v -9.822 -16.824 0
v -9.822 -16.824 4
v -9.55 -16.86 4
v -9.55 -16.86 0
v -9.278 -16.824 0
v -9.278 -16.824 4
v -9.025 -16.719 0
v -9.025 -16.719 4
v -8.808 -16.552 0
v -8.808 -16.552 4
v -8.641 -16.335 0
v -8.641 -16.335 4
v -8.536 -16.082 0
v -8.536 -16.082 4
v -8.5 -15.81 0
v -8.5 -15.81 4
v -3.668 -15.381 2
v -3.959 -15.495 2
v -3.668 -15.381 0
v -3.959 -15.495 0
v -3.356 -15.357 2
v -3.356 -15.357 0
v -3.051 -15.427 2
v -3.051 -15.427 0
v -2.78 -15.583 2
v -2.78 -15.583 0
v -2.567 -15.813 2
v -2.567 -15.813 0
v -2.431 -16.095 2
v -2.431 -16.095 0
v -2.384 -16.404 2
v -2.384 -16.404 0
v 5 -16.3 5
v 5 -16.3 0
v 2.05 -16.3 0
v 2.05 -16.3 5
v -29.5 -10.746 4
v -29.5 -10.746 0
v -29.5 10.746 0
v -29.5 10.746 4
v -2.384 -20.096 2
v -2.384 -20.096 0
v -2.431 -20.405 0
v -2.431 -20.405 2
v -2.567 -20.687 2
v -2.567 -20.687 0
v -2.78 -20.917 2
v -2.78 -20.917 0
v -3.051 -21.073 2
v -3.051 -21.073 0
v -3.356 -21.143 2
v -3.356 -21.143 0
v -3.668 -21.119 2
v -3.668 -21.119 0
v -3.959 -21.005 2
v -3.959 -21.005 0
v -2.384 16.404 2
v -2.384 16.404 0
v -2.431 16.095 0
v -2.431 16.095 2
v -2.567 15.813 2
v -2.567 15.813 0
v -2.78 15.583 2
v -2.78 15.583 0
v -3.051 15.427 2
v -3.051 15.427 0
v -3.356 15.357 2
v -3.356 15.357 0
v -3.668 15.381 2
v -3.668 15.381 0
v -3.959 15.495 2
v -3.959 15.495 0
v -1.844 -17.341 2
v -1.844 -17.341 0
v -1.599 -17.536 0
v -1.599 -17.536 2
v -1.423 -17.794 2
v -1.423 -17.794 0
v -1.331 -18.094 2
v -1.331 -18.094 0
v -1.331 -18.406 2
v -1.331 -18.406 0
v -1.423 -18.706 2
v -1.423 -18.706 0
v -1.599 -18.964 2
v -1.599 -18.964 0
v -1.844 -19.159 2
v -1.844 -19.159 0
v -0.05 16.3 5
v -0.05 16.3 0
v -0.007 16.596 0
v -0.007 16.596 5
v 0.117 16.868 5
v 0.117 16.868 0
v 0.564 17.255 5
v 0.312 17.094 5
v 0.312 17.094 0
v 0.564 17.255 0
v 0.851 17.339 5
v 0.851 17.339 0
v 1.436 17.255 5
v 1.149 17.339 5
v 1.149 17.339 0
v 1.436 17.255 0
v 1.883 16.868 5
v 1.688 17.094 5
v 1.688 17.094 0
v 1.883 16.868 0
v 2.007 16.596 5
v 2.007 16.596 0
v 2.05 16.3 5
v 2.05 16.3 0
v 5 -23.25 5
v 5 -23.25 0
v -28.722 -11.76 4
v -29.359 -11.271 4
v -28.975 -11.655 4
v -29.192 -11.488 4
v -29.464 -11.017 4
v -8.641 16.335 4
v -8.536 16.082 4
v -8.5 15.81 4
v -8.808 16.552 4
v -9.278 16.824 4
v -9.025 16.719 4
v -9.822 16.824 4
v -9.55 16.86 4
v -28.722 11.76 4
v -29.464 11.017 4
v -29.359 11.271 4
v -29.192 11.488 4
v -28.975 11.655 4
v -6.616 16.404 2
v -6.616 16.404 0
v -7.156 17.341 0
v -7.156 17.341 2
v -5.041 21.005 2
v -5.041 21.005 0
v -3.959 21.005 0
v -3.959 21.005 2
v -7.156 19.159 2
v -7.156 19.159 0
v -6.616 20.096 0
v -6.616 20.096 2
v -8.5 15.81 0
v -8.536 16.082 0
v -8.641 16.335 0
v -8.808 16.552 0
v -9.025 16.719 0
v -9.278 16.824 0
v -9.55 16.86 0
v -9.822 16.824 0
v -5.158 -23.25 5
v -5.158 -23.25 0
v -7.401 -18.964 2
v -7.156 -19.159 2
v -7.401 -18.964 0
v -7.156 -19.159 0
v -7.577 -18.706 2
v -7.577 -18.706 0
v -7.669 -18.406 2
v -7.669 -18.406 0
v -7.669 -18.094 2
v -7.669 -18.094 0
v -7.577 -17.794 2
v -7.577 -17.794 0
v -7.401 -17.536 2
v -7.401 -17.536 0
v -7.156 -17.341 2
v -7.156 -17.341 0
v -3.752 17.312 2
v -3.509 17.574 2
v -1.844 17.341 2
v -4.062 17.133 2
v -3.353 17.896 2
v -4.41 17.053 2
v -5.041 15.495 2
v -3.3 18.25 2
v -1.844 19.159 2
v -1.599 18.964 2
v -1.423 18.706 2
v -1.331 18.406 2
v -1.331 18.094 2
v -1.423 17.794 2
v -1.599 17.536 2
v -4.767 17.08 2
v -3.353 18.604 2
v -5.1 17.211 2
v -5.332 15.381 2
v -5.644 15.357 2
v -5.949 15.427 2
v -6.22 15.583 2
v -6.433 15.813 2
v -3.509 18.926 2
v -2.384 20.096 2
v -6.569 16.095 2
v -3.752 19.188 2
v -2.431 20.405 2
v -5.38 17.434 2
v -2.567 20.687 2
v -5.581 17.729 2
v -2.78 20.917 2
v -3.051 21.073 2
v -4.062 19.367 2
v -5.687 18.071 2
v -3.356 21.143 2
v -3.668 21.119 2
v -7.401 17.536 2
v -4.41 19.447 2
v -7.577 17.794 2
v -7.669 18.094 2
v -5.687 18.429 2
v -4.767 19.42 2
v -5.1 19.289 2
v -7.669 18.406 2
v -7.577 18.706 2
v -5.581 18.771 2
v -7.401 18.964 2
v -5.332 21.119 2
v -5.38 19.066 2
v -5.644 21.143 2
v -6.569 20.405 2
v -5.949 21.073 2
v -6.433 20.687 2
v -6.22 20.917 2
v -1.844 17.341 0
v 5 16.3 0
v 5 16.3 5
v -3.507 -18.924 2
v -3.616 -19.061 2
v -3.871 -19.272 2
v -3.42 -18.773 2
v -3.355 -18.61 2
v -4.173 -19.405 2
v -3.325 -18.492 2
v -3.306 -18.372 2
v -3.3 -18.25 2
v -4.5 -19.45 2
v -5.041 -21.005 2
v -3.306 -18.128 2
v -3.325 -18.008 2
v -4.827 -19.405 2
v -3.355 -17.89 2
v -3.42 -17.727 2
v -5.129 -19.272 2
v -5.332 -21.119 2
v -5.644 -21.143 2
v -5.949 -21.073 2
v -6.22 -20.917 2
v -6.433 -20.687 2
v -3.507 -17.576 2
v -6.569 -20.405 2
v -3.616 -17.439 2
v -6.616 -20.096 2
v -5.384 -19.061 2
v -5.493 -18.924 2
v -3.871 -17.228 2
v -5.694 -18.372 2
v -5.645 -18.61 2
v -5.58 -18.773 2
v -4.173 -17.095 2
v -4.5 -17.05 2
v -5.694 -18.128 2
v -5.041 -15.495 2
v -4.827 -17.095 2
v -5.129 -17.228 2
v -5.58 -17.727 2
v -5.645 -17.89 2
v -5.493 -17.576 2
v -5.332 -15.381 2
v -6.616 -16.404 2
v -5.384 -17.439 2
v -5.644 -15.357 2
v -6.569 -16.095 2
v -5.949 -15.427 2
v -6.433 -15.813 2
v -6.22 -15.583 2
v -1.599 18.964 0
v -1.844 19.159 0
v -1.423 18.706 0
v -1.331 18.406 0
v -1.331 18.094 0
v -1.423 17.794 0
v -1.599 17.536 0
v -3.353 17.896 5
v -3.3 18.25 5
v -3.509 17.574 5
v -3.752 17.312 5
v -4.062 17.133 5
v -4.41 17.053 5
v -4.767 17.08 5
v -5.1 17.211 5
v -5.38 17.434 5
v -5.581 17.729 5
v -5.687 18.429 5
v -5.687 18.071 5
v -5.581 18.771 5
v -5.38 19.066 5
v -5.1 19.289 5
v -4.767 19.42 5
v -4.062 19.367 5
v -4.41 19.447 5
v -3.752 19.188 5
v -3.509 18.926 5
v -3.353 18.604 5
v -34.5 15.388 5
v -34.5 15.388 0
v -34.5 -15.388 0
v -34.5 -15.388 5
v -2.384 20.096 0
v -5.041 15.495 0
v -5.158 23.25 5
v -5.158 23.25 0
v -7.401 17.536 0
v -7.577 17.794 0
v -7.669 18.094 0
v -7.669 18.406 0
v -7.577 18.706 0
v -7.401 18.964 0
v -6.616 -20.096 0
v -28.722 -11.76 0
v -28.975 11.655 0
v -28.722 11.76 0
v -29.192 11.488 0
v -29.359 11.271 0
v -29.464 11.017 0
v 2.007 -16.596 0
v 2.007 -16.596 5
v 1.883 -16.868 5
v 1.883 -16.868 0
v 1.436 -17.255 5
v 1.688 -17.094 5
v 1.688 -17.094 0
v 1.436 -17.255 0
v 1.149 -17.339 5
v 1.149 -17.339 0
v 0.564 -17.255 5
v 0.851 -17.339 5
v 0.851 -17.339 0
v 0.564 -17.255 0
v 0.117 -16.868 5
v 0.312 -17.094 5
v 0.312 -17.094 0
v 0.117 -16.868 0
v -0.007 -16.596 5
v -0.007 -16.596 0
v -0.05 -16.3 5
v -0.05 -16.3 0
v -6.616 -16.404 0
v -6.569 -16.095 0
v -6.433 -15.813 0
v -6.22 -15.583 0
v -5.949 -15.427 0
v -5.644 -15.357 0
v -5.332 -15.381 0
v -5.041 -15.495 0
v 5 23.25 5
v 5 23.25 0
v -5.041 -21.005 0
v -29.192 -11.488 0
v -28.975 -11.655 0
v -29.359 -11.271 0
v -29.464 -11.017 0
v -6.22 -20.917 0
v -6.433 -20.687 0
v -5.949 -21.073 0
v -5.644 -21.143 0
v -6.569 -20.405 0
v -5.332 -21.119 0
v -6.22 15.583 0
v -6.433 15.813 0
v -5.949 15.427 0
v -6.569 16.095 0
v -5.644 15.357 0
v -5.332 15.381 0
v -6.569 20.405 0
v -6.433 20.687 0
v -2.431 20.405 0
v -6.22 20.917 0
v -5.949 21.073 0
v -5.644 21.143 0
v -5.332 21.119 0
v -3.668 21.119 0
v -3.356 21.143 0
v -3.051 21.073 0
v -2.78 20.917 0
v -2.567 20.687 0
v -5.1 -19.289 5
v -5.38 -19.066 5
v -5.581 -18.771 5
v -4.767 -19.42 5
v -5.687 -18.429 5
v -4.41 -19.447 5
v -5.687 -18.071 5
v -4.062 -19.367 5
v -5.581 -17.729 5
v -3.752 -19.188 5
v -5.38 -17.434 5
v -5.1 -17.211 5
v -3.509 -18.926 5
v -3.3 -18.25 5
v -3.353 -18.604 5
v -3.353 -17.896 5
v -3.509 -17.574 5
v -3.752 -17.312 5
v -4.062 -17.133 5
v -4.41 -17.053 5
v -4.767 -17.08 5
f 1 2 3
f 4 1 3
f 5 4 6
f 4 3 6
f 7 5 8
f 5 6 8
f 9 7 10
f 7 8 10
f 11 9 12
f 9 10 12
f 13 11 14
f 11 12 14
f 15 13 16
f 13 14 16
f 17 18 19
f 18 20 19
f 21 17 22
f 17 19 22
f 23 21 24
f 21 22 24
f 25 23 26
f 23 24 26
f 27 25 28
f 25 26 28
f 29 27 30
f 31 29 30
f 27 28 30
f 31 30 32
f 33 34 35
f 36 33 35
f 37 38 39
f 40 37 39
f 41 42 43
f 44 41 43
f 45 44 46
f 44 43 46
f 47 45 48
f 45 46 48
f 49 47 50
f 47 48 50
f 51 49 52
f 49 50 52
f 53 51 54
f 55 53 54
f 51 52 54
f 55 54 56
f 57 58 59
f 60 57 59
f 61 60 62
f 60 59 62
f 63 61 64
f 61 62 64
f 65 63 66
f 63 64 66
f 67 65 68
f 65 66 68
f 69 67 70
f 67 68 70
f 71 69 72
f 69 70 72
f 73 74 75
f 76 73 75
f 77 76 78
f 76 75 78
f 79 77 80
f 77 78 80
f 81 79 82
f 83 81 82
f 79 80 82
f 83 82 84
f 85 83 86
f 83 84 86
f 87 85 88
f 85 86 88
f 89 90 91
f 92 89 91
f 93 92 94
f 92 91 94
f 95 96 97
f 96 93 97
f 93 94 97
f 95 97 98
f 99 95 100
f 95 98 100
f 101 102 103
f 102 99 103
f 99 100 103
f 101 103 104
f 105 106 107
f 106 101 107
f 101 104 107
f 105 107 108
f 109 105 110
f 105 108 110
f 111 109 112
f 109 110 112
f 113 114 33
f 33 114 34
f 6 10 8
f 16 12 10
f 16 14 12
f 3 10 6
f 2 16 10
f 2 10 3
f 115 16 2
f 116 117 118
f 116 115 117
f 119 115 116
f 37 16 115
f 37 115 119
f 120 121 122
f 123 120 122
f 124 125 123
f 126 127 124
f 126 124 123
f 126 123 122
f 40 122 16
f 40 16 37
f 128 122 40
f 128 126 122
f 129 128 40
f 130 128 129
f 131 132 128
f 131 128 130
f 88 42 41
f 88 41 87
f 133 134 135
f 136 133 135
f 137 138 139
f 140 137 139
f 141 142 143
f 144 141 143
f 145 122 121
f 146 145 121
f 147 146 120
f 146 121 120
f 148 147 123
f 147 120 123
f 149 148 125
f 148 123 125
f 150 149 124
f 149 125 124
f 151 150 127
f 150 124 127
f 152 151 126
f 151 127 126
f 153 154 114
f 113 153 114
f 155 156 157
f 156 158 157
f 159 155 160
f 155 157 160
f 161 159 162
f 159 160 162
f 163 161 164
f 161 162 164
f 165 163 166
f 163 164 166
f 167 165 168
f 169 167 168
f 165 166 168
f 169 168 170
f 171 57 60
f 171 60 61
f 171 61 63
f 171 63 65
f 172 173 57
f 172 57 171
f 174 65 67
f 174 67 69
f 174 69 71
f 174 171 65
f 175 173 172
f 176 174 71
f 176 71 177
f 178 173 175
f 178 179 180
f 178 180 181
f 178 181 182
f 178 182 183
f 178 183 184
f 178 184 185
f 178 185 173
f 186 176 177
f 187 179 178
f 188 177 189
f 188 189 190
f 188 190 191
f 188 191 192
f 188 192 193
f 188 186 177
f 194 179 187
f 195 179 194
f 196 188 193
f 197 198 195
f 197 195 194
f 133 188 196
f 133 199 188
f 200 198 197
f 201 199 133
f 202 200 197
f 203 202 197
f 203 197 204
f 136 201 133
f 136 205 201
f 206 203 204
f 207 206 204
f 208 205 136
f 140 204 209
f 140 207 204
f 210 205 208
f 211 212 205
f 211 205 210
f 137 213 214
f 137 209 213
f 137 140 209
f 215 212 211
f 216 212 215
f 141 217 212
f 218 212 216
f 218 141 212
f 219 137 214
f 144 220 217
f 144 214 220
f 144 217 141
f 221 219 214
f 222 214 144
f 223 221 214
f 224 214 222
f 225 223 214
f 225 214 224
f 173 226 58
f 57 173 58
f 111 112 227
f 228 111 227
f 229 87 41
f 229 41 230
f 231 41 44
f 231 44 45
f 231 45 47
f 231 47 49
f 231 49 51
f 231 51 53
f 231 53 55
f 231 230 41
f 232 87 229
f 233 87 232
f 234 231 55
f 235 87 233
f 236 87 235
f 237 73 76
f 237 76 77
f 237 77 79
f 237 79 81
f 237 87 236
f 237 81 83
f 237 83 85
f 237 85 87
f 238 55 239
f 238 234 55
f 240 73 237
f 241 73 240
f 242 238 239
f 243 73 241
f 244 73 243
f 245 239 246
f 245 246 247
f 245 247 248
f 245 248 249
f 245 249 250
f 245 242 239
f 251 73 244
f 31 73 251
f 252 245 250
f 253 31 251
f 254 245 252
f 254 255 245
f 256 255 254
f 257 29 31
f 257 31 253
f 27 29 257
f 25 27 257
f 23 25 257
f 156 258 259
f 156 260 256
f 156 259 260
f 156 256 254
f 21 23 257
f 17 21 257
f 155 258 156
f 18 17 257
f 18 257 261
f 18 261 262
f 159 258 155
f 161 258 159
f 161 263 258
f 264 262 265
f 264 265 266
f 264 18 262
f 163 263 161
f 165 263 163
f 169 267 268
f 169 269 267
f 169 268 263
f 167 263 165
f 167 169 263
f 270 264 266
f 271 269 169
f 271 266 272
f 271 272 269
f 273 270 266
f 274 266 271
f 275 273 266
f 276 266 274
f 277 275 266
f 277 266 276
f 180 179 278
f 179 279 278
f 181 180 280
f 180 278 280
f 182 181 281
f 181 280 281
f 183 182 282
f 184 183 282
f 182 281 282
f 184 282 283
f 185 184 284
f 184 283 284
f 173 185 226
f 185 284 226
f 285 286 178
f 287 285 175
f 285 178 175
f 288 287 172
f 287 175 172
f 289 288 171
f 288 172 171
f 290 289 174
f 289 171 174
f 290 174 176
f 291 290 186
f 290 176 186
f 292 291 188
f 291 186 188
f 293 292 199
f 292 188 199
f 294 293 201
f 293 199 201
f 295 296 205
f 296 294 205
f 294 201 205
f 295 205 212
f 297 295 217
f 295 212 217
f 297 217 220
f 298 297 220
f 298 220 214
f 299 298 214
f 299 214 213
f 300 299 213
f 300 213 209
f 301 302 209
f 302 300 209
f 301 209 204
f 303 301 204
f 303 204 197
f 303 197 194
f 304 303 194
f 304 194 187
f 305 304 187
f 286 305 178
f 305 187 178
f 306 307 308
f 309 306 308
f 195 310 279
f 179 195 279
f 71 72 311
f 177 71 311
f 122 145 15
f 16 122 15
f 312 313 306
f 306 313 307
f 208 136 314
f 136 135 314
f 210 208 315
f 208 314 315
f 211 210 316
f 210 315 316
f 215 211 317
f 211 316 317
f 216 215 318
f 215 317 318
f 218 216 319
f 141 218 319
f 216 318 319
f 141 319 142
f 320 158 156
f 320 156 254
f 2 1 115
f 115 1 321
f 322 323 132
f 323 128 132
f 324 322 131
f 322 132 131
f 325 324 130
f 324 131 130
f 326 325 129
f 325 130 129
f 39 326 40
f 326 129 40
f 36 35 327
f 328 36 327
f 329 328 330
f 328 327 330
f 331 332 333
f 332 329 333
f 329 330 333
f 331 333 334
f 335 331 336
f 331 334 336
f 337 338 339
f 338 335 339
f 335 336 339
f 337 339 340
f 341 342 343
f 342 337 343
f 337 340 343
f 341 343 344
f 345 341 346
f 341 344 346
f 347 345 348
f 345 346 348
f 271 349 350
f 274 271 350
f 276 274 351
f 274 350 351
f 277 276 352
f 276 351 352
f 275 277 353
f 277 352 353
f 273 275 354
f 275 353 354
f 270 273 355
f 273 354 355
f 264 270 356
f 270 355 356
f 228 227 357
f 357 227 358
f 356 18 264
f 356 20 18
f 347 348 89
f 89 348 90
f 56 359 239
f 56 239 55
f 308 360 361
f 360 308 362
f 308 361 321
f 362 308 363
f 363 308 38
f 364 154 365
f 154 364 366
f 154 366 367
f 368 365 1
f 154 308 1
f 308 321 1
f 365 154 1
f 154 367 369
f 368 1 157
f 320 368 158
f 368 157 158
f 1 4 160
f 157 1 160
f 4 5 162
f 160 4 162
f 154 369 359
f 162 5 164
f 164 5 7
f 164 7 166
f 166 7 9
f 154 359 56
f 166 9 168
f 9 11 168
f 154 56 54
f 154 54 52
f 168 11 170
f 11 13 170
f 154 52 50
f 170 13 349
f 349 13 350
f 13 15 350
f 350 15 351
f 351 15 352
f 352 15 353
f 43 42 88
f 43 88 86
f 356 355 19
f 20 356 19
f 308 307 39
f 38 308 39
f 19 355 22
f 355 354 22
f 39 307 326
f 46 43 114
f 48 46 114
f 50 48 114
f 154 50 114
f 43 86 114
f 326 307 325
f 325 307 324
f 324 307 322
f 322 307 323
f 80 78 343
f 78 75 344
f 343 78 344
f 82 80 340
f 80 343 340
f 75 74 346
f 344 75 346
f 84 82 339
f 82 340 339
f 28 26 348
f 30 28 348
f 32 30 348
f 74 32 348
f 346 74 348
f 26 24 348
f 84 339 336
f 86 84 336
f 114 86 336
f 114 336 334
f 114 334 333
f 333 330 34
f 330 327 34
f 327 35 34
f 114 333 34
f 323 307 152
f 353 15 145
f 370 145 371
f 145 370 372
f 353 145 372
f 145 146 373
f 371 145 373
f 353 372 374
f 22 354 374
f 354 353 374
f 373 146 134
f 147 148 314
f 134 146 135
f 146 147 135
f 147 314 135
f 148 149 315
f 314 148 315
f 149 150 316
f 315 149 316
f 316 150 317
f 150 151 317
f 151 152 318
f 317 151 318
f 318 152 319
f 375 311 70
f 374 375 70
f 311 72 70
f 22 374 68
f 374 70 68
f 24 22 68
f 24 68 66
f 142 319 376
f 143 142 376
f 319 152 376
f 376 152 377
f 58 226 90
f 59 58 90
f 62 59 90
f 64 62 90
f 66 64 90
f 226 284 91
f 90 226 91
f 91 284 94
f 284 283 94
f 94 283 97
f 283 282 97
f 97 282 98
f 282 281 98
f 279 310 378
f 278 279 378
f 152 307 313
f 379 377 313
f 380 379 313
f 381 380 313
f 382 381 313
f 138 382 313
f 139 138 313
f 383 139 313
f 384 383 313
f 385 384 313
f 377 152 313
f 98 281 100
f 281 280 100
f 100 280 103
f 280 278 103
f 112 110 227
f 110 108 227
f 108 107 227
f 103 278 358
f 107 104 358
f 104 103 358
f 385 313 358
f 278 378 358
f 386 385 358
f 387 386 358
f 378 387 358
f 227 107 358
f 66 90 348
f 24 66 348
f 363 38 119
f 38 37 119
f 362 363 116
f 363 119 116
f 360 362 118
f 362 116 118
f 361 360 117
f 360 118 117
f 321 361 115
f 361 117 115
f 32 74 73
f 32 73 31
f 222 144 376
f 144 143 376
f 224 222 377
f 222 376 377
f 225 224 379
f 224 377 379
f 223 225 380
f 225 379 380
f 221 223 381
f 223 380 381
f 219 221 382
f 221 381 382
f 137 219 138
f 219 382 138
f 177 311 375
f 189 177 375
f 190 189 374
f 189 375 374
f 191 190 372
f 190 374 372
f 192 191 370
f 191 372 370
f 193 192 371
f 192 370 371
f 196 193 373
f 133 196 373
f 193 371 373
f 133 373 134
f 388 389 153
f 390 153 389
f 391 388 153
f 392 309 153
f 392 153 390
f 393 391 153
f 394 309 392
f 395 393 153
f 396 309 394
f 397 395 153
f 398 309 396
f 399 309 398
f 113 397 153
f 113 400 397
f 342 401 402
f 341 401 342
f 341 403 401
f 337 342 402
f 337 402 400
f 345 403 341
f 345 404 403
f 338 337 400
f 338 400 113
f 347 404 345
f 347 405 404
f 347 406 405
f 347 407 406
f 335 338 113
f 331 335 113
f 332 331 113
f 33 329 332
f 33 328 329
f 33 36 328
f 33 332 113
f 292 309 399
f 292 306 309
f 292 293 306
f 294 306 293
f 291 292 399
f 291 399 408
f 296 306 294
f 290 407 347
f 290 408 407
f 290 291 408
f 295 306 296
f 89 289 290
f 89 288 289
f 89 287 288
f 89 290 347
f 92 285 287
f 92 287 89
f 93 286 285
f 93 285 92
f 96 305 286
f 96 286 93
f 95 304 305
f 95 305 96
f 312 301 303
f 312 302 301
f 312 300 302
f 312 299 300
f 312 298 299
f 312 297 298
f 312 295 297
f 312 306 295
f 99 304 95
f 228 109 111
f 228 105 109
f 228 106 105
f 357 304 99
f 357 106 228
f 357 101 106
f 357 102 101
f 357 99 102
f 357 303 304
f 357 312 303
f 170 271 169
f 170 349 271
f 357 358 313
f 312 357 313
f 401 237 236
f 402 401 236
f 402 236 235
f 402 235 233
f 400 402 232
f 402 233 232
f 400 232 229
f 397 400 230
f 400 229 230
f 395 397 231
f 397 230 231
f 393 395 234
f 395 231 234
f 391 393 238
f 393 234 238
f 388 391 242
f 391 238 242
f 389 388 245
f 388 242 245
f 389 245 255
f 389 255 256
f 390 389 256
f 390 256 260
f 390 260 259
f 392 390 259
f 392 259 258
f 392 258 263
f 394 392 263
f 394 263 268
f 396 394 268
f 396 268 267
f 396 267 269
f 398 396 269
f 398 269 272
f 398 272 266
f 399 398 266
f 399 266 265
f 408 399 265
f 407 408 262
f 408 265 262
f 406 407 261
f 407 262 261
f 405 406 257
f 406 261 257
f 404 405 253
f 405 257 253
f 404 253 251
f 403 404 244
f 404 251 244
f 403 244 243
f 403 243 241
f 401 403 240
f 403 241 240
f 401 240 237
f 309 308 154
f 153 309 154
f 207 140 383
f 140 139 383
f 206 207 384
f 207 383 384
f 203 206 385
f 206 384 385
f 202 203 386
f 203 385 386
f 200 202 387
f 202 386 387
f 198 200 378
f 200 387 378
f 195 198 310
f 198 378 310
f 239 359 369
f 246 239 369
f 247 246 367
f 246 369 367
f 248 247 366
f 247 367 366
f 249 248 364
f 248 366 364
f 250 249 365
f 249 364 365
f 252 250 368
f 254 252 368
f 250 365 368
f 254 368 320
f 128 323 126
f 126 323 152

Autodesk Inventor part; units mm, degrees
ref_plane "YZ Plane" through (0, 0, 0) normal (1, 0, 0) x (0, 1, 0)
ref_plane "XZ Plane" through (0, 0, 0) normal (0, 1, 0) x (-1, 0, 0)
ref_plane "XY Plane" through (0, 0, 0) normal (0, 0, 1) x (1, 0, 0)
sketch "スケッチ1" plane through (0, 0, 0) normal (0, 0, 1) x (1, 0, 0)
  line L0 (0, 16.25) -> (28.465632, 16.25) construction
  line L1 (28.465632, 16.25) -> (28.465632, -16.25) construction
  line L2 (28.465632, -16.25) -> (0, -16.25) construction
  line L3 (0, -16.25) -> (0, 16.25) construction
  line L4 (5, 23.25) -> (-5.158262, 23.25)
  line L5 (-5.158262, 23.25) -> (-34.5, 15.387905)
  line L6 (-34.5, 15.387905) -> (-34.5, -15.387905)
  line L7 (-34.5, -15.387905) -> (-5.158262, -23.25)
  line L8 (-5.158262, -23.25) -> (5, -23.25)
  line L9 (5, -23.25) -> (5, -16.3)
  line L10 (5, -16.3) -> (2.05, -16.3)
  arc A0 (-0.05, -16.3) -> (2.05, -16.3) centre (1, -16.3) ccw
  line L11 (-0.05, -16.3) -> (-0.05, 16.3)
  arc A1 (2.05, 16.3) -> (-0.05, 16.3) centre (1, 16.3) ccw
  line L12 (28.465632, 0) -> (0, 0) construction
  line L13 (2.05, 16.3) -> (5, 16.3)
  line L14 (5, 16.3) -> (5, 23.25)
  line L15 (28.515632, 16.3) -> (-0.05, 16.3) construction
  line L16 (-0.05, 16.3) -> (-0.05, -16.3) construction
  line L17 (-0.05, -16.3) -> (28.515632, -16.3) construction
  line L18 (28.515632, -16.3) -> (28.515632, 16.3) construction
  circle A2 centre (-4.5, 18.25) radius 1.2
  circle A3 centre (-4.5, -18.25) radius 1.2
  line L19 (0, 0) -> (28.465632, 0) construction
  line L20 (2.5, 16.25) -> (2.5, -16.25) construction
  circle A4 centre (-4.5, 18.25) radius 5 construction
  line L21 (-6.087713, 15.5) -> (-7.675426, 18.25)
  line L22 (-7.675426, 18.25) -> (-6.087713, 21)
  line L23 (-6.087713, 21) -> (-2.912287, 21)
  line L24 (-2.912287, 21) -> (-1.324574, 18.25)
  line L25 (-1.324574, 18.25) -> (-2.912287, 15.5)
  line L26 (-2.912287, 15.5) -> (-6.087713, 15.5)
  point P0 (-34.5, 0)
  point P1 (-0.05, 0)
  dimension "d98" = 32.5
  dimension "d100" = 0.05
  dimension "d101" = 1.05
  dimension "d102" = 5
  dimension "d104" = 2.4
  dimension "d106" = 2.5
  dimension "d107" = 7
  dimension "d108" = 18.25
  dimension "d109" = 5
  dimension "d110" = 30
  dimension "d111" = 165
  dimension "d130" = 5.5
extrude "押し出し1" add sketch "スケッチ1" along normal blind 5 contours L14 L13 A1 L11 A0 L10 L9 L8 L7 L6 L5 L4 | L21 L22 L23 L24 L25 L26
sketch "スケッチ6" plane through (0, 0, 0) normal (0, 0, -1) x (-1, 0, 0)
  line L0 (34.5, -15.387905) -> (5.158262, -23.25)
  line L1 (34.5, 15.387905) -> (34.5, -15.387905)
  line L2 (5.158262, 23.25) -> (34.5, 15.387905)
  line L3 (8.5, 17.178203) -> (8.5, -17.178203)
  line L4 (8.5, -17.178203) -> (29.5, -11.55127)
  line L5 (29.5, -11.55127) -> (29.5, 11.55127)
  line L6 (29.5, 11.55127) -> (8.5, 17.178203)
  circle A0 centre (4.5, 18.25) radius 1.2
  point P0 (0, 0)
  dimension "d113" = 5
  dimension "d114" = 5
  dimension "d115" = 5
  dimension "d133" = 4
extrude "押し出し4" cut sketch "スケッチ6" against normal blind 4 contours L6 L5 L4 L3
fillet "フィレット2" radius 1.05 4 edges at (-8.5, 17.1782, 2) (-8.5, -17.1782, 2) (-29.5, 11.5513, 2) (-29.5, -11.5513, 2)
sketch "スケッチ7" plane through (0, 0, 0) normal (0, 0, -1) x (-1, 0, 0)
  circle A0 centre (4.5, -18.25) radius 1.2
  circle A1 centre (4.5, 18.25) radius 1.2
  line L0 (2.912287, 15.5) -> (1.324574, 18.25)
  line L1 (1.324574, 18.25) -> (2.912287, 21)
  line L2 (2.912287, 21) -> (6.087713, 21)
  line L3 (6.087713, 21) -> (7.675426, 18.25)
  line L4 (7.675426, 18.25) -> (6.087713, 15.5)
  line L5 (6.087713, 15.5) -> (2.912287, 15.5)
  line L6 (7.6812, 18.25) -> (6.0906, 21.005)
  line L7 (6.0906, 21.005) -> (2.9094, 21.005)
  line L8 (2.9094, 21.005) -> (1.3188, 18.25)
  line L9 (1.3188, 18.25) -> (2.9094, 15.495)
  line L10 (2.9094, 15.495) -> (6.0906, 15.495)
  line L11 (6.0906, 15.495) -> (7.6812, 18.25)
  circle A2 centre (6.6312, 18.25) radius 1.05
  circle A3 centre (5.5656, 20.095673) radius 1.05
  circle A4 centre (3.4344, 20.095673) radius 1.05
  circle A5 centre (2.3688, 18.25) radius 1.05
  circle A6 centre (3.4344, 16.404327) radius 1.05
  circle A7 centre (5.5656, 16.404327) radius 1.05
  line L12 (7.6812, -18.25) -> (6.0906, -21.005)
  line L13 (6.0906, -21.005) -> (2.9094, -21.005)
  line L14 (2.9094, -21.005) -> (1.3188, -18.25)
  line L15 (1.3188, -18.25) -> (2.9094, -15.495)
  line L16 (2.9094, -15.495) -> (6.0906, -15.495)
  line L17 (6.0906, -15.495) -> (7.6812, -18.25)
  circle A8 centre (6.6312, -18.25) radius 1.05
  circle A9 centre (5.5656, -16.404327) radius 1.05
  circle A10 centre (3.4344, -16.404327) radius 1.05
  circle A11 centre (2.3688, -18.25) radius 1.05
  circle A12 centre (3.4344, -20.095673) radius 1.05
  circle A13 centre (5.5656, -20.095673) radius 1.05
  point P0 (0, 0)
  point P1 (6.0906, 21.005)
  point P2 (2.9094, 21.005)
  point P3 (1.3188, 18.25)
  point P4 (2.9094, 15.495)
  point P5 (6.0906, 15.495)
  point P6 (2.9094, -15.495)
  point P7 (2.9094, -21.005)
  point P8 (6.0906, -21.005)
  dimension "d121" = 2.1
  dimension "d119" = 5.5
  dimension "d120" = 0.005
  dimension "d124" = 360
  dimension "d128" = 360
sketch "スケッチ7 outline for 押し出し5" plane through (0, 0, 0) normal (0, 0, -1) x (-1, 0, 0)
  arc A0 (6.6156, 20.095673) -> (5.0406, 21.005) centre (5.5656, 20.095673) ccw
  line L0 (5.0406, 21.005) -> (3.9594, 21.005)
  arc A1 (3.9594, 21.005) -> (2.3844, 20.095673) centre (3.4344, 20.095673) ccw
  line L1 (2.3844, 20.095673) -> (1.8438, 19.159327)
  arc A2 (1.8438, 19.159327) -> (1.8438, 17.340673) centre (2.3688, 18.25) ccw
  line L2 (1.8438, 17.340673) -> (2.3844, 16.404327)
  arc A3 (2.3844, 16.404327) -> (3.9594, 15.495) centre (3.4344, 16.404327) ccw
  line L3 (3.9594, 15.495) -> (5.0406, 15.495)
  arc A4 (5.0406, 15.495) -> (6.6156, 16.404327) centre (5.5656, 16.404327) ccw
  line L4 (6.6156, 16.404327) -> (7.1562, 17.340673)
  arc A5 (7.1562, 17.340673) -> (7.1562, 19.159327) centre (6.6312, 18.25) ccw
  line L5 (7.1562, 19.159327) -> (6.6156, 20.095673)
  arc A6 (6.6156, -16.404327) -> (5.0406, -15.495) centre (5.5656, -16.404327) ccw
  line L6 (3.9594, -15.495) -> (5.0406, -15.495)
  arc A7 (3.9594, -15.495) -> (2.3844, -16.404327) centre (3.4344, -16.404327) ccw
  line L7 (1.8438, -17.340673) -> (2.3844, -16.404327)
  arc A8 (1.8438, -17.340673) -> (1.8438, -19.159327) centre (2.3688, -18.25) ccw
  line L8 (2.3844, -20.095673) -> (1.8438, -19.159327)
  arc A9 (2.3844, -20.095673) -> (3.9594, -21.005) centre (3.4344, -20.095673) ccw
  line L9 (5.0406, -21.005) -> (3.9594, -21.005)
  arc A10 (5.0406, -21.005) -> (6.6156, -20.095673) centre (5.5656, -20.095673) ccw
  line L10 (7.1562, -19.159327) -> (6.6156, -20.095673)
  arc A11 (7.1562, -19.159327) -> (7.1562, -17.340673) centre (6.6312, -18.25) ccw
  line L11 (6.6156, -16.404327) -> (7.1562, -17.340673)
  arc A12 (5.644781, -17.890171) -> (5.384012, -17.438505) centre (4.5, -18.25) ccw
  arc A13 (5.644781, -17.890171) -> (5.644781, -18.609829) centre (6.6312, -18.25) ccw
  arc A14 (5.384012, -19.061495) -> (5.644781, -18.609829) centre (4.5, -18.25) ccw
  arc A15 (5.384012, -19.061495) -> (4.760769, -19.421324) centre (5.5656, -20.095673) ccw
  arc A16 (4.239231, -19.421324) -> (4.760769, -19.421324) centre (4.5, -18.25) ccw
  arc A17 (4.239231, -19.421324) -> (3.615988, -19.061495) centre (3.4344, -20.095673) ccw
  arc A18 (3.355219, -18.609829) -> (3.615988, -19.061495) centre (4.5, -18.25) ccw
  arc A19 (3.355219, -18.609829) -> (3.355219, -17.890171) centre (2.3688, -18.25) ccw
  arc A20 (3.615988, -17.438505) -> (3.355219, -17.890171) centre (4.5, -18.25) ccw
  arc A21 (3.615988, -17.438505) -> (4.239231, -17.078676) centre (3.4344, -16.404327) ccw
  arc A22 (4.760769, -17.078676) -> (4.239231, -17.078676) centre (4.5, -18.25) ccw
  arc A23 (4.760769, -17.078676) -> (5.384012, -17.438505) centre (5.5656, -16.404327) ccw
extrude "押し出し5" cut sketch "スケッチ7 outline for 押し出し5" against normal blind 2
equation "\"d114\" = d113"
equation "\"d115\" = d113"
properties part number "胴体_サブフレーム_1_7" material "アセタール樹脂、黒"
